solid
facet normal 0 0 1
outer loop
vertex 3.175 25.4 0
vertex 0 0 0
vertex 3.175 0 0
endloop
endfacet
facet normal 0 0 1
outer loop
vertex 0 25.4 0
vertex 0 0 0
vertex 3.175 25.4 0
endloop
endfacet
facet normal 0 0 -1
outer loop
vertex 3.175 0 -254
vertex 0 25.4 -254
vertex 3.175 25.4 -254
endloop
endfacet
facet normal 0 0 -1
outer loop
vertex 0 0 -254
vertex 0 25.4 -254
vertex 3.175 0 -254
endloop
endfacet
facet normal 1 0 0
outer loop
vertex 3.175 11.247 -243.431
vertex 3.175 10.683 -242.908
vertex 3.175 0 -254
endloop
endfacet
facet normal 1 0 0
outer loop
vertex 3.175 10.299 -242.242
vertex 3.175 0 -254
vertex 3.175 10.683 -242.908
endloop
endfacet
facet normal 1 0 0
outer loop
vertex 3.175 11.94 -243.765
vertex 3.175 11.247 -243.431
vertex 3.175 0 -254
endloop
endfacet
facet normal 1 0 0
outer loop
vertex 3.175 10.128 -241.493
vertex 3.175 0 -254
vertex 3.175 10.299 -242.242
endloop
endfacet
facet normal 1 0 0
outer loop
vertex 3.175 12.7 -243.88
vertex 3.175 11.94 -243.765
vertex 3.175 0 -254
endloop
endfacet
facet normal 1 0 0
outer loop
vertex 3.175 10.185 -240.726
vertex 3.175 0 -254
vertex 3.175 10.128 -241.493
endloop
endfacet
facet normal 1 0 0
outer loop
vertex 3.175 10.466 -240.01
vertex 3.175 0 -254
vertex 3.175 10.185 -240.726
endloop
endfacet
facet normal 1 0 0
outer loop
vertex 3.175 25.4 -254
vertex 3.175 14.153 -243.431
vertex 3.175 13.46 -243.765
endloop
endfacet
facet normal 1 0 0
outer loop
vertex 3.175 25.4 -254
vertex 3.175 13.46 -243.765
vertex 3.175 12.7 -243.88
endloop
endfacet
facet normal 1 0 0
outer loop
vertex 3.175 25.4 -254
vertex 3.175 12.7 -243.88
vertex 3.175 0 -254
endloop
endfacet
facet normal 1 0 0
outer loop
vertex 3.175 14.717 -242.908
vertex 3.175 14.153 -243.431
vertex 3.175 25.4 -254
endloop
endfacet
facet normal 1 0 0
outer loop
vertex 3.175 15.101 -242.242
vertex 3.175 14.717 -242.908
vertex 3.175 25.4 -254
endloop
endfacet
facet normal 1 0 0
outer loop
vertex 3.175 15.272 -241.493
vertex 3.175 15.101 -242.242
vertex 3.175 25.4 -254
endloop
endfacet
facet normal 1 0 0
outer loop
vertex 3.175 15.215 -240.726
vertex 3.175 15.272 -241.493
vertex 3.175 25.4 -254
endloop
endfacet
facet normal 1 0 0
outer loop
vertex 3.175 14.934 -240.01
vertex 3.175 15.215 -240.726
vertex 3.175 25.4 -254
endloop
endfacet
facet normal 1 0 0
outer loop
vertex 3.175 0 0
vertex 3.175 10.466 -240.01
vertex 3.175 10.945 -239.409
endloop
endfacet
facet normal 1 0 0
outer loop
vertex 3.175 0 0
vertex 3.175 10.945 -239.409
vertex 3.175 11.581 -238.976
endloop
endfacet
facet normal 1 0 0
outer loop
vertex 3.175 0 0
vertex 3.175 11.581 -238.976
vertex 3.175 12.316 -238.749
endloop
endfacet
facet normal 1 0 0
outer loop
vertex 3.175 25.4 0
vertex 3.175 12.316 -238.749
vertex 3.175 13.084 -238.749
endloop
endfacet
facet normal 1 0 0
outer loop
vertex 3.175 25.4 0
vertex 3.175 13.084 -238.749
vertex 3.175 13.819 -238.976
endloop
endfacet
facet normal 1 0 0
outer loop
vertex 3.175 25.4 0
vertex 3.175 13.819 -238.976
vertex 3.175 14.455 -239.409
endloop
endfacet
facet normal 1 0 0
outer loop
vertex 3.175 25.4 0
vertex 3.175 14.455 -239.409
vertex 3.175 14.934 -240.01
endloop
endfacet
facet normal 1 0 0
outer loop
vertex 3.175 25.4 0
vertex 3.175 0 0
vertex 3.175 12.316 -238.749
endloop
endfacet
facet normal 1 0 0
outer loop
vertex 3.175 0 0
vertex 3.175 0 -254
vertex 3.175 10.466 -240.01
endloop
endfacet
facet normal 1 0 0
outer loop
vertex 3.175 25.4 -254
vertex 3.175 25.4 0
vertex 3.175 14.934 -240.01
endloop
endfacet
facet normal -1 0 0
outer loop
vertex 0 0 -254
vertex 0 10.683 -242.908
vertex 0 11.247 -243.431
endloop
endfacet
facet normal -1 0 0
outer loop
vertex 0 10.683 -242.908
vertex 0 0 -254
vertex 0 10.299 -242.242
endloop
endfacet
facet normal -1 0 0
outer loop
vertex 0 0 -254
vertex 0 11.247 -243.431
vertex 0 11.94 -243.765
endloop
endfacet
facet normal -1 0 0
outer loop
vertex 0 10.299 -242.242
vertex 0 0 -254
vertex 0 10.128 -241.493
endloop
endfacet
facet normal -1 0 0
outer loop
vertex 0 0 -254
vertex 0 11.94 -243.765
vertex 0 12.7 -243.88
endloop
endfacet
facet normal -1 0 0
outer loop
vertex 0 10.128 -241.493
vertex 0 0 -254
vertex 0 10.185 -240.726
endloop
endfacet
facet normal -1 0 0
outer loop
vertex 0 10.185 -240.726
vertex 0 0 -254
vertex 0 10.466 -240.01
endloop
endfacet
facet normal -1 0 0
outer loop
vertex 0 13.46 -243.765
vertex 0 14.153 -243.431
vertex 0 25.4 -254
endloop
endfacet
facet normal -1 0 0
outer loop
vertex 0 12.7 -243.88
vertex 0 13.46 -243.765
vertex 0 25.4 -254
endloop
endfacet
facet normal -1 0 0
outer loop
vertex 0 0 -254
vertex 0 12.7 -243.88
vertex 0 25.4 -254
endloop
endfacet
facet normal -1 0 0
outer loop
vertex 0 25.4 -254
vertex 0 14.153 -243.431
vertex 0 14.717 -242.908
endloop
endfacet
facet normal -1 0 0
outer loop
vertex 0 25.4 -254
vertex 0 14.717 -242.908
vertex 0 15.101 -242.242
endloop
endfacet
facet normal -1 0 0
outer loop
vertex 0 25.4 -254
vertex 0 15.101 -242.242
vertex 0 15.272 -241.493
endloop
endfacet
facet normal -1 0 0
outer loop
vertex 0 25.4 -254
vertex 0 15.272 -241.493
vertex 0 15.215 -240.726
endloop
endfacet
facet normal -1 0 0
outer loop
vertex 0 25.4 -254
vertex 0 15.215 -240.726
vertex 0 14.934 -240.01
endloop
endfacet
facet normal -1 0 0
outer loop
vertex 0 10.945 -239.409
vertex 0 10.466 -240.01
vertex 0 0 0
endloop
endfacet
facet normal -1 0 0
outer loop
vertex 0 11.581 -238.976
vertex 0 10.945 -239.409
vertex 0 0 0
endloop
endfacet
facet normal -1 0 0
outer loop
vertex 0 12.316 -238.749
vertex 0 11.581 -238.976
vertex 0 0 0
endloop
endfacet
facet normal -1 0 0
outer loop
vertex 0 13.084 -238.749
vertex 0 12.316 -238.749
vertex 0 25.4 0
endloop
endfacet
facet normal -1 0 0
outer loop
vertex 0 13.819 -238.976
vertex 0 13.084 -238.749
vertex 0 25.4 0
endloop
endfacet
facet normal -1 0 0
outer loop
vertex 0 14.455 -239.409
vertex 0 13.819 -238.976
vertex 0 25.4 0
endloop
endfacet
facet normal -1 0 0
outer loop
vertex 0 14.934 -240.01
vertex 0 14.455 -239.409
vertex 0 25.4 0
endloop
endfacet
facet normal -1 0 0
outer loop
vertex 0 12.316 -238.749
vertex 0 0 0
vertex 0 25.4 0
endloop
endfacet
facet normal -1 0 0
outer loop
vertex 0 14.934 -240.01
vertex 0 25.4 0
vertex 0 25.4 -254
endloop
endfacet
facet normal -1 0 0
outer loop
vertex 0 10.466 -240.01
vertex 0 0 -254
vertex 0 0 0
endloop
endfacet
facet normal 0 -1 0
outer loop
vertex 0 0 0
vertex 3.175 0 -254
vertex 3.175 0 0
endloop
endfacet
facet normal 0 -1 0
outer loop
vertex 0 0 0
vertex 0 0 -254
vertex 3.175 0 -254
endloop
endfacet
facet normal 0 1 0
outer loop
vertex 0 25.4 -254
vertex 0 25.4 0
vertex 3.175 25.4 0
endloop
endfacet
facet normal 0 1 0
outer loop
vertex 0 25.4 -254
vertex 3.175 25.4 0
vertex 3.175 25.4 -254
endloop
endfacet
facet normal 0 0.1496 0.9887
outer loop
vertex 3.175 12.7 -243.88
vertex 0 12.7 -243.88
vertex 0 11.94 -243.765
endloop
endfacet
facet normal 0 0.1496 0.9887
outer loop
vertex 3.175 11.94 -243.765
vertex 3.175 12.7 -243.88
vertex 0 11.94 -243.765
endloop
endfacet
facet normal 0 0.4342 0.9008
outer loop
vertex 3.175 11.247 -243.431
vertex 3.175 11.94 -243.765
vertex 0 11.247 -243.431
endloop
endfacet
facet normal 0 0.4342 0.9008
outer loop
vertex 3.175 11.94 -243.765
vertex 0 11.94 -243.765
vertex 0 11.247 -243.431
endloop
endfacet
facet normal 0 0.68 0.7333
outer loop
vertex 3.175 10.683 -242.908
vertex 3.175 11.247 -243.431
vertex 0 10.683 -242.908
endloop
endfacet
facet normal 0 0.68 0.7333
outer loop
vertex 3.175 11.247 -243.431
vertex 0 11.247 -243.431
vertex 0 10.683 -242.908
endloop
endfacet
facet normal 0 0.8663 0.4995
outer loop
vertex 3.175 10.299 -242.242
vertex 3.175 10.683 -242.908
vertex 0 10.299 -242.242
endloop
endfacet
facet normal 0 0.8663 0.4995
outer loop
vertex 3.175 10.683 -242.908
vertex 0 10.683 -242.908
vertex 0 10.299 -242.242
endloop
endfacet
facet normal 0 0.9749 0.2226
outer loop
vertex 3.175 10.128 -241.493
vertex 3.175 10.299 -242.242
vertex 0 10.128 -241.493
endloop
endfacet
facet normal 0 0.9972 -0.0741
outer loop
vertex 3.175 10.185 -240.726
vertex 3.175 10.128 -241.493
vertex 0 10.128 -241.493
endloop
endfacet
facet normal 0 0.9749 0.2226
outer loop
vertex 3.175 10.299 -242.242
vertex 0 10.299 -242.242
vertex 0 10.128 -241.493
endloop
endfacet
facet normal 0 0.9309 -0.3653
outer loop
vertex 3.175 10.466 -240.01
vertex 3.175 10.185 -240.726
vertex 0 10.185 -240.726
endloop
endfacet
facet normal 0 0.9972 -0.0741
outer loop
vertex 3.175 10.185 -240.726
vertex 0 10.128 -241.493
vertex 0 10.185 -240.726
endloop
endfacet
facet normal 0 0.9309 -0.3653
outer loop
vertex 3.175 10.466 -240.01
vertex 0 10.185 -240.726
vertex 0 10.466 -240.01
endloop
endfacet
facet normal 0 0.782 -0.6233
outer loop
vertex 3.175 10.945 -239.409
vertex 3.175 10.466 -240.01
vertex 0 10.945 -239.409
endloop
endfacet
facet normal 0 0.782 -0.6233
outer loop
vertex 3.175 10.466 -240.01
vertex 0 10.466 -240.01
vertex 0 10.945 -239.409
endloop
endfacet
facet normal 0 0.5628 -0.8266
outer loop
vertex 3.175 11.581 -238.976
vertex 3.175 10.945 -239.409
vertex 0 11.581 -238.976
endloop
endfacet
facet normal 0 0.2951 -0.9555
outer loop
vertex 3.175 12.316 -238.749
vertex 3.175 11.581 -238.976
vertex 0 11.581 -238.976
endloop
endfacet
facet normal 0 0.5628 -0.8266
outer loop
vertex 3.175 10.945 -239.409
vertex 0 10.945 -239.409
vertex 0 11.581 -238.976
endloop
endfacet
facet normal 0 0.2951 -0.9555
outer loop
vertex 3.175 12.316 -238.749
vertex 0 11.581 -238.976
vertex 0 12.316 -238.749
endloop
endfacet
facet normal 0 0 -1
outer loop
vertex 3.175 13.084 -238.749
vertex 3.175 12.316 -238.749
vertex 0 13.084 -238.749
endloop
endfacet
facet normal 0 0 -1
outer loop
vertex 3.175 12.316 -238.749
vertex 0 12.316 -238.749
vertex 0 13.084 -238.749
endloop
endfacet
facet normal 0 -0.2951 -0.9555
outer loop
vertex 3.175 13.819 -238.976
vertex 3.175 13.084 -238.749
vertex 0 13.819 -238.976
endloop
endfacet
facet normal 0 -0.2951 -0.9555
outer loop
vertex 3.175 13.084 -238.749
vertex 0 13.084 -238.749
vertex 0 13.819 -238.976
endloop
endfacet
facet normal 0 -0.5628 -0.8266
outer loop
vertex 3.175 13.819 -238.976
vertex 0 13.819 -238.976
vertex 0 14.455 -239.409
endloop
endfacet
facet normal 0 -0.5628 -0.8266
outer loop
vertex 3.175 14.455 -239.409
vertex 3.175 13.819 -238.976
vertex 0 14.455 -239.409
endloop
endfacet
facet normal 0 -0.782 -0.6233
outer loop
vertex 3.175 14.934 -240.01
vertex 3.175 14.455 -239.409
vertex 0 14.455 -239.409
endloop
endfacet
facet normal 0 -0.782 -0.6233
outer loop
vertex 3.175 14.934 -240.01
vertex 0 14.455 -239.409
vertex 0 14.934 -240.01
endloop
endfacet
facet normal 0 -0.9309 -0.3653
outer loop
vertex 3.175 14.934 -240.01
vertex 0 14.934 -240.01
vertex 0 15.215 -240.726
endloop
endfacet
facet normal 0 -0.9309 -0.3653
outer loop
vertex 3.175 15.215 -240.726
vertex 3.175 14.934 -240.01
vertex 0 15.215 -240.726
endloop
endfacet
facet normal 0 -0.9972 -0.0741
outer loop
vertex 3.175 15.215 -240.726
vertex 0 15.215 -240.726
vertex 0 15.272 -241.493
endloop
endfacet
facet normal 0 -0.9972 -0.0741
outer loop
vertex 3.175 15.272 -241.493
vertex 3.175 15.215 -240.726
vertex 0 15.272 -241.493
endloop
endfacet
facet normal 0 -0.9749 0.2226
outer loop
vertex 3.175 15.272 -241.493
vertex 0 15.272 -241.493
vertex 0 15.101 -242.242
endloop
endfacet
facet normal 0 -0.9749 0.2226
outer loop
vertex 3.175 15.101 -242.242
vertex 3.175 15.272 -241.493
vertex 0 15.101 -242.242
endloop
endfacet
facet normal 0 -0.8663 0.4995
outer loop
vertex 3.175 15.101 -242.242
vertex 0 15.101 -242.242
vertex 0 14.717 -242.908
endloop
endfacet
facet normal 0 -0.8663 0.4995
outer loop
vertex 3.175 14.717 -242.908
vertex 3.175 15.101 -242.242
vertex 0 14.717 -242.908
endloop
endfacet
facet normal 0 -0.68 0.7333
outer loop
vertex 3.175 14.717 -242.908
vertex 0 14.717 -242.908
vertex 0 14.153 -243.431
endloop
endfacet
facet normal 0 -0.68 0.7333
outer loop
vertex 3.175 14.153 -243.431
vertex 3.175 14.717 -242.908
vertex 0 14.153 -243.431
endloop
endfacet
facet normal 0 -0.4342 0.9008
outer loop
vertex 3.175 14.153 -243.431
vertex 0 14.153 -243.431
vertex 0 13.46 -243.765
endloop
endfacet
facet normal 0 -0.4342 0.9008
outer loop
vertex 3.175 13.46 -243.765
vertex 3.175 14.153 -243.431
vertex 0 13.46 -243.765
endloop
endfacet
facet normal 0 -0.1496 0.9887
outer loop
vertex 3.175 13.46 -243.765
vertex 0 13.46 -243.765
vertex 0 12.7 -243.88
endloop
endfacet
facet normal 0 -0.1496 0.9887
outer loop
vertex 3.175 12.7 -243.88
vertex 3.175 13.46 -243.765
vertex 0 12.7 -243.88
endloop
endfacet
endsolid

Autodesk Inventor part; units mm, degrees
ref_plane "YZ Plane" through (0, 0, 0) normal (1, 0, 0) x (0, 1, 0)
ref_plane "XZ Plane" through (0, 0, 0) normal (0, 1, 0) x (-1, 0, 0)
ref_plane "XY Plane" through (0, 0, 0) normal (0, 0, 1) x (1, 0, 0)
sketch "Sketch1" plane through (0, 0, 0) normal (1, 0, 0) x (0, 1, 0)
  line L0 (0, 0) -> (25.4, 0)
  line L1 (25.4, 0) -> (25.4, -254)
  line L2 (25.4, -254) -> (0, -254)
  line L3 (0, -254) -> (0, 0)
  dimension "d0" = 25.4
  dimension "d1" = 254
extrude "Extrusion1" add sketch "Sketch1" along normal blind 3.175
hole "Hole1" at (3.175, 12.7, -241.3) direction (-1, 0, 0) diameter 5.1594 end through all
properties part number "0.125 in Flatbar Support Beam"
